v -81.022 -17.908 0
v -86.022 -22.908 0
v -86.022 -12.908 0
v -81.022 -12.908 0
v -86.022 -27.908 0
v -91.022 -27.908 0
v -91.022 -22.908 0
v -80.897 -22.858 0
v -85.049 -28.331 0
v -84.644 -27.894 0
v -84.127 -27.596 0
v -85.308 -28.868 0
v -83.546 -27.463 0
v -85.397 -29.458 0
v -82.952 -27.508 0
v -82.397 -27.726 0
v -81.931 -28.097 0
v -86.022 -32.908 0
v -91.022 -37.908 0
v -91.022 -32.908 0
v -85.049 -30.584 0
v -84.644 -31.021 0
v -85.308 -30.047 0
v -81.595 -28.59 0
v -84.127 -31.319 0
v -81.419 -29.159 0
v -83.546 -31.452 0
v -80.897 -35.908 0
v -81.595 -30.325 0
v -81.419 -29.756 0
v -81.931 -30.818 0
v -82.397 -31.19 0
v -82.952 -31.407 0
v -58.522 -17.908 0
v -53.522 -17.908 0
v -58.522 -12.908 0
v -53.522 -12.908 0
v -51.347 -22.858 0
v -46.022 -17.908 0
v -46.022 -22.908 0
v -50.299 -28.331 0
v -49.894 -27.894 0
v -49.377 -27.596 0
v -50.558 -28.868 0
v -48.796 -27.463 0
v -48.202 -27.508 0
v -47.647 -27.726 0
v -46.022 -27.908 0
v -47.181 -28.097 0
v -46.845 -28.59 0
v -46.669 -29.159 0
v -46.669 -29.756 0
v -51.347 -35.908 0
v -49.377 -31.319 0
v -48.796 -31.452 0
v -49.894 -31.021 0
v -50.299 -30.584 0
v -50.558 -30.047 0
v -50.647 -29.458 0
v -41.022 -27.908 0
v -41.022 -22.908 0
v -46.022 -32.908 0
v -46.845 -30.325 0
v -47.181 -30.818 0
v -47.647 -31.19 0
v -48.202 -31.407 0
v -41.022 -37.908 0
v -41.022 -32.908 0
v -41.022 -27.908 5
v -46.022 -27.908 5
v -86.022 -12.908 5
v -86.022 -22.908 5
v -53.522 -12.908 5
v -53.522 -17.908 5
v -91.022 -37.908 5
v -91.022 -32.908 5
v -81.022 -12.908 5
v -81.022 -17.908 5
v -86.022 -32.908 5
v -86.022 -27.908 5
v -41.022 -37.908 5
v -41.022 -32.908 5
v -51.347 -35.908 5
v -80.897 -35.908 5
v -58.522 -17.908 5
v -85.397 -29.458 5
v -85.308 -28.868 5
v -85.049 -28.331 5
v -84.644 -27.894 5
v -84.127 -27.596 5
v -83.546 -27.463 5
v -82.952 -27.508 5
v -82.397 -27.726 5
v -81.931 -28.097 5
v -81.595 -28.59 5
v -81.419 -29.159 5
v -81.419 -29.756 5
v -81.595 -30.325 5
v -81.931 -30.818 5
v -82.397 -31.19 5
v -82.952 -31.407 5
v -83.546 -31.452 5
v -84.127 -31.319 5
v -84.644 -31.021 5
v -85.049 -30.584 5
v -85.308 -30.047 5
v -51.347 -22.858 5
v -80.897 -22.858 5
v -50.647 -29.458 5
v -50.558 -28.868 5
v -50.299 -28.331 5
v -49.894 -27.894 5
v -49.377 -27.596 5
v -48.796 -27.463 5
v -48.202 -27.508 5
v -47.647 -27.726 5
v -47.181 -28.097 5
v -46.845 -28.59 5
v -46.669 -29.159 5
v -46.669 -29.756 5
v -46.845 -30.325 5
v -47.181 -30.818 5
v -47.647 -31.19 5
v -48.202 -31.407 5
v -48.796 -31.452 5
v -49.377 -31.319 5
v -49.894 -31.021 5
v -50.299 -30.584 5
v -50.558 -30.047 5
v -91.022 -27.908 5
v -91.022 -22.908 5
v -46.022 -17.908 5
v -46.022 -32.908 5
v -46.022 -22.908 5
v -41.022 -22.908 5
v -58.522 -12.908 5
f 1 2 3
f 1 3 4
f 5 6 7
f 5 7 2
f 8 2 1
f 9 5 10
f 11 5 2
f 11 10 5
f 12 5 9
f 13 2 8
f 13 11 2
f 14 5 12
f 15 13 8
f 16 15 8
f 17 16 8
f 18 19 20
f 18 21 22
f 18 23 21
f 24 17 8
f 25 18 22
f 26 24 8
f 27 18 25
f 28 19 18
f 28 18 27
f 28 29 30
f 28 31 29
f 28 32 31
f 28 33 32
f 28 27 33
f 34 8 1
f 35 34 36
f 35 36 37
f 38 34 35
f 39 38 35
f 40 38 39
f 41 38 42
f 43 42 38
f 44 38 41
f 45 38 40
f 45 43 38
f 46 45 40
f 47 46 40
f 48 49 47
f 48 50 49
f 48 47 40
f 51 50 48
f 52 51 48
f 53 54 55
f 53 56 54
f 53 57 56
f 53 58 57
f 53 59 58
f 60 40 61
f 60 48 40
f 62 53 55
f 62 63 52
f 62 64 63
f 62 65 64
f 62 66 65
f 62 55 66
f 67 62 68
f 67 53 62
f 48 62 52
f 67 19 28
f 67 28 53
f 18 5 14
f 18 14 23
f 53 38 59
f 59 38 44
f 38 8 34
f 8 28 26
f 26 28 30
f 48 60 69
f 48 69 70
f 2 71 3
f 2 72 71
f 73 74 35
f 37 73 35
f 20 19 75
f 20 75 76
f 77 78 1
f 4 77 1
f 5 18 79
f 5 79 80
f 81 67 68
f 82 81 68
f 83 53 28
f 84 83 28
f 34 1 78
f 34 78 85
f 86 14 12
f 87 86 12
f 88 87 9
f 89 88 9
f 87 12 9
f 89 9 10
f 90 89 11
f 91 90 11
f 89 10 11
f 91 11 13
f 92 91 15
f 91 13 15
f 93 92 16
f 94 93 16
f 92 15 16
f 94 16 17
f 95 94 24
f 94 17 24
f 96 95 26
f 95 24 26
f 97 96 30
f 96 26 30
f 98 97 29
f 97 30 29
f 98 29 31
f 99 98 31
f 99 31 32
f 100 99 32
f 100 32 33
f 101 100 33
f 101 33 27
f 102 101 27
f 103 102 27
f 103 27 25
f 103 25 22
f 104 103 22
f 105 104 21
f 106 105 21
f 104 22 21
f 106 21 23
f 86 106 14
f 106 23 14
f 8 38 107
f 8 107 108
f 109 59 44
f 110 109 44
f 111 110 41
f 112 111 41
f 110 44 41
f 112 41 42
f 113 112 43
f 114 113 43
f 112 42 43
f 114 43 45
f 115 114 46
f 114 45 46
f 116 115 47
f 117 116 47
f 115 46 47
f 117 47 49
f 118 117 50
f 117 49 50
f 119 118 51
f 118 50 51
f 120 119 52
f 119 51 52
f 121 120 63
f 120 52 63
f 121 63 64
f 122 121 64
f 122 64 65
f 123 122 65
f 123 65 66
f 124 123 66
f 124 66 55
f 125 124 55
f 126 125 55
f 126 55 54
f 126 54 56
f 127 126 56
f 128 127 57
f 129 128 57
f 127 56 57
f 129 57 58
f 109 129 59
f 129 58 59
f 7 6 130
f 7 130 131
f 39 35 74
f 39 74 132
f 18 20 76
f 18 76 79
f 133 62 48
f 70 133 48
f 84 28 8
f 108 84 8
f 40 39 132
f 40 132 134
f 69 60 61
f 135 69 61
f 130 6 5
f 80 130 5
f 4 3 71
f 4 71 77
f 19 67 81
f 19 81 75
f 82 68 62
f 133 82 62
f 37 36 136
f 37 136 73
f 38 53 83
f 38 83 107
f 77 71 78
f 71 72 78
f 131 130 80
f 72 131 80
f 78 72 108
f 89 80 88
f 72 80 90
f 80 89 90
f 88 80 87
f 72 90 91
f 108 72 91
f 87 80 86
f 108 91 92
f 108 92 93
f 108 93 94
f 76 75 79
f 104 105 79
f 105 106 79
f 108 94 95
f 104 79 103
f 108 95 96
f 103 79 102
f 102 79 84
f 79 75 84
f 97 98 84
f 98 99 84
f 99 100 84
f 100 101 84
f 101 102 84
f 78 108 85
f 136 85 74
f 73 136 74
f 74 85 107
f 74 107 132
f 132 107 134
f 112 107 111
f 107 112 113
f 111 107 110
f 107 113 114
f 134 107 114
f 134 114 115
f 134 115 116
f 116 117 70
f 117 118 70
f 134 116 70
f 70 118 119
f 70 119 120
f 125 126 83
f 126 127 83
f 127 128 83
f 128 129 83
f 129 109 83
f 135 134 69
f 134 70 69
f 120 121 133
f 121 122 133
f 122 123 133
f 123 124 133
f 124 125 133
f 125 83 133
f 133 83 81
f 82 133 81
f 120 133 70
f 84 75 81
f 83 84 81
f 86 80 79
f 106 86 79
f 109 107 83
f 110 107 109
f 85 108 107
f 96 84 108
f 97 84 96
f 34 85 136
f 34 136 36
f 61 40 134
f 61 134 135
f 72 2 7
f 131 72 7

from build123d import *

# Parameters (mm, degrees)
ESQUISSE1_W             = 25
ESQUISSE1_H             = 25
BOSS_EXTRU_1_DEPTH      = 5
ESQUISSE3_W             = 5
ESQUISSE3_H             = 5
ENL_V_MAT_EXTRU_1_DEPTH = 5
ESQUISSE4_R             = 2
ESQUISSE4_W             = 29.55
ESQUISSE4_H             = 13.05
ENL_V_MAT_EXTRU_2_DEPTH = 5
ESQUISSE5_W             = 5
ESQUISSE5_H             = 5
BOSS_EXTRU_2_DEPTH      = 5


with BuildPart() as part:
    # Esquisse1 → Boss.-Extru.1 (new body)
    with BuildSketch(Plane.XY):
        with Locations((-53.521610088, -25.407575758)):
            Rectangle(ESQUISSE1_W, ESQUISSE1_H)
    boss_extru_1 = extrude(amount=BOSS_EXTRU_1_DEPTH)

    # Esquisse3 → Enlèv. mat.-Extru.1 (cut)
    with BuildSketch(Plane(origin=(0, 0, 0), x_dir=(-1, 0, 0), z_dir=(0, 0, -1))):
        Polygon((66.021610088, -12.907575758), (66.021610088, -17.907575758), (46.021610088, -17.907575758), (46.021610088, -22.907575758), (41.021610088, -22.907575758), (41.021610088, -12.907575758), align=None)
        with Locations((43.521610088, -30.407575758)):
            Rectangle(ESQUISSE3_W, ESQUISSE3_H)
    enl_v_mat_extru_1 = extrude(amount=-ENL_V_MAT_EXTRU_1_DEPTH, mode=Mode.SUBTRACT)

    # Symétrie1: Boss.-Extru.1, Enlèv. mat.-Extru.1 across plane
    add(boss_extru_1.mirror(Plane(origin=(-66.021610088, -12.907575758, 5), x_dir=(0, 0, 1), z_dir=(1, 0, 0))))
    add(enl_v_mat_extru_1.mirror(Plane(origin=(-66.021610088, -12.907575758, 5), x_dir=(0, 0, 1), z_dir=(1, 0, 0))), mode=Mode.SUBTRACT)

    # Esquisse4 → Enlèv. mat.-Extru.2 (cut)
    with BuildSketch(Plane(origin=(0, 0, 0), x_dir=(-1, 0, 0), z_dir=(0, 0, -1))):
        with Locations((83.396610088, -29.457575758)):
            Circle(ESQUISSE4_R)
        with Locations((48.646610088, -29.457575758)):
            Circle(ESQUISSE4_R)
        with Locations((66.121610088, -29.382575758)):
            Rectangle(ESQUISSE4_W, ESQUISSE4_H)
    extrude(amount=-ENL_V_MAT_EXTRU_2_DEPTH, mode=Mode.SUBTRACT)

    # Esquisse5 → Boss.-Extru.2 (add)
    with BuildSketch(Plane(origin=(0, -17.907575758, 0), x_dir=(1, 0, 0), z_dir=(0, 1, 0))):
        with Locations((-83.521610088, -2.5)):
            Rectangle(ESQUISSE5_W, ESQUISSE5_H)
        with Locations((-56.021610088, -2.5)):
            Rectangle(ESQUISSE5_W, ESQUISSE5_H)
    extrude(amount=BOSS_EXTRU_2_DEPTH)


solid = part.part
